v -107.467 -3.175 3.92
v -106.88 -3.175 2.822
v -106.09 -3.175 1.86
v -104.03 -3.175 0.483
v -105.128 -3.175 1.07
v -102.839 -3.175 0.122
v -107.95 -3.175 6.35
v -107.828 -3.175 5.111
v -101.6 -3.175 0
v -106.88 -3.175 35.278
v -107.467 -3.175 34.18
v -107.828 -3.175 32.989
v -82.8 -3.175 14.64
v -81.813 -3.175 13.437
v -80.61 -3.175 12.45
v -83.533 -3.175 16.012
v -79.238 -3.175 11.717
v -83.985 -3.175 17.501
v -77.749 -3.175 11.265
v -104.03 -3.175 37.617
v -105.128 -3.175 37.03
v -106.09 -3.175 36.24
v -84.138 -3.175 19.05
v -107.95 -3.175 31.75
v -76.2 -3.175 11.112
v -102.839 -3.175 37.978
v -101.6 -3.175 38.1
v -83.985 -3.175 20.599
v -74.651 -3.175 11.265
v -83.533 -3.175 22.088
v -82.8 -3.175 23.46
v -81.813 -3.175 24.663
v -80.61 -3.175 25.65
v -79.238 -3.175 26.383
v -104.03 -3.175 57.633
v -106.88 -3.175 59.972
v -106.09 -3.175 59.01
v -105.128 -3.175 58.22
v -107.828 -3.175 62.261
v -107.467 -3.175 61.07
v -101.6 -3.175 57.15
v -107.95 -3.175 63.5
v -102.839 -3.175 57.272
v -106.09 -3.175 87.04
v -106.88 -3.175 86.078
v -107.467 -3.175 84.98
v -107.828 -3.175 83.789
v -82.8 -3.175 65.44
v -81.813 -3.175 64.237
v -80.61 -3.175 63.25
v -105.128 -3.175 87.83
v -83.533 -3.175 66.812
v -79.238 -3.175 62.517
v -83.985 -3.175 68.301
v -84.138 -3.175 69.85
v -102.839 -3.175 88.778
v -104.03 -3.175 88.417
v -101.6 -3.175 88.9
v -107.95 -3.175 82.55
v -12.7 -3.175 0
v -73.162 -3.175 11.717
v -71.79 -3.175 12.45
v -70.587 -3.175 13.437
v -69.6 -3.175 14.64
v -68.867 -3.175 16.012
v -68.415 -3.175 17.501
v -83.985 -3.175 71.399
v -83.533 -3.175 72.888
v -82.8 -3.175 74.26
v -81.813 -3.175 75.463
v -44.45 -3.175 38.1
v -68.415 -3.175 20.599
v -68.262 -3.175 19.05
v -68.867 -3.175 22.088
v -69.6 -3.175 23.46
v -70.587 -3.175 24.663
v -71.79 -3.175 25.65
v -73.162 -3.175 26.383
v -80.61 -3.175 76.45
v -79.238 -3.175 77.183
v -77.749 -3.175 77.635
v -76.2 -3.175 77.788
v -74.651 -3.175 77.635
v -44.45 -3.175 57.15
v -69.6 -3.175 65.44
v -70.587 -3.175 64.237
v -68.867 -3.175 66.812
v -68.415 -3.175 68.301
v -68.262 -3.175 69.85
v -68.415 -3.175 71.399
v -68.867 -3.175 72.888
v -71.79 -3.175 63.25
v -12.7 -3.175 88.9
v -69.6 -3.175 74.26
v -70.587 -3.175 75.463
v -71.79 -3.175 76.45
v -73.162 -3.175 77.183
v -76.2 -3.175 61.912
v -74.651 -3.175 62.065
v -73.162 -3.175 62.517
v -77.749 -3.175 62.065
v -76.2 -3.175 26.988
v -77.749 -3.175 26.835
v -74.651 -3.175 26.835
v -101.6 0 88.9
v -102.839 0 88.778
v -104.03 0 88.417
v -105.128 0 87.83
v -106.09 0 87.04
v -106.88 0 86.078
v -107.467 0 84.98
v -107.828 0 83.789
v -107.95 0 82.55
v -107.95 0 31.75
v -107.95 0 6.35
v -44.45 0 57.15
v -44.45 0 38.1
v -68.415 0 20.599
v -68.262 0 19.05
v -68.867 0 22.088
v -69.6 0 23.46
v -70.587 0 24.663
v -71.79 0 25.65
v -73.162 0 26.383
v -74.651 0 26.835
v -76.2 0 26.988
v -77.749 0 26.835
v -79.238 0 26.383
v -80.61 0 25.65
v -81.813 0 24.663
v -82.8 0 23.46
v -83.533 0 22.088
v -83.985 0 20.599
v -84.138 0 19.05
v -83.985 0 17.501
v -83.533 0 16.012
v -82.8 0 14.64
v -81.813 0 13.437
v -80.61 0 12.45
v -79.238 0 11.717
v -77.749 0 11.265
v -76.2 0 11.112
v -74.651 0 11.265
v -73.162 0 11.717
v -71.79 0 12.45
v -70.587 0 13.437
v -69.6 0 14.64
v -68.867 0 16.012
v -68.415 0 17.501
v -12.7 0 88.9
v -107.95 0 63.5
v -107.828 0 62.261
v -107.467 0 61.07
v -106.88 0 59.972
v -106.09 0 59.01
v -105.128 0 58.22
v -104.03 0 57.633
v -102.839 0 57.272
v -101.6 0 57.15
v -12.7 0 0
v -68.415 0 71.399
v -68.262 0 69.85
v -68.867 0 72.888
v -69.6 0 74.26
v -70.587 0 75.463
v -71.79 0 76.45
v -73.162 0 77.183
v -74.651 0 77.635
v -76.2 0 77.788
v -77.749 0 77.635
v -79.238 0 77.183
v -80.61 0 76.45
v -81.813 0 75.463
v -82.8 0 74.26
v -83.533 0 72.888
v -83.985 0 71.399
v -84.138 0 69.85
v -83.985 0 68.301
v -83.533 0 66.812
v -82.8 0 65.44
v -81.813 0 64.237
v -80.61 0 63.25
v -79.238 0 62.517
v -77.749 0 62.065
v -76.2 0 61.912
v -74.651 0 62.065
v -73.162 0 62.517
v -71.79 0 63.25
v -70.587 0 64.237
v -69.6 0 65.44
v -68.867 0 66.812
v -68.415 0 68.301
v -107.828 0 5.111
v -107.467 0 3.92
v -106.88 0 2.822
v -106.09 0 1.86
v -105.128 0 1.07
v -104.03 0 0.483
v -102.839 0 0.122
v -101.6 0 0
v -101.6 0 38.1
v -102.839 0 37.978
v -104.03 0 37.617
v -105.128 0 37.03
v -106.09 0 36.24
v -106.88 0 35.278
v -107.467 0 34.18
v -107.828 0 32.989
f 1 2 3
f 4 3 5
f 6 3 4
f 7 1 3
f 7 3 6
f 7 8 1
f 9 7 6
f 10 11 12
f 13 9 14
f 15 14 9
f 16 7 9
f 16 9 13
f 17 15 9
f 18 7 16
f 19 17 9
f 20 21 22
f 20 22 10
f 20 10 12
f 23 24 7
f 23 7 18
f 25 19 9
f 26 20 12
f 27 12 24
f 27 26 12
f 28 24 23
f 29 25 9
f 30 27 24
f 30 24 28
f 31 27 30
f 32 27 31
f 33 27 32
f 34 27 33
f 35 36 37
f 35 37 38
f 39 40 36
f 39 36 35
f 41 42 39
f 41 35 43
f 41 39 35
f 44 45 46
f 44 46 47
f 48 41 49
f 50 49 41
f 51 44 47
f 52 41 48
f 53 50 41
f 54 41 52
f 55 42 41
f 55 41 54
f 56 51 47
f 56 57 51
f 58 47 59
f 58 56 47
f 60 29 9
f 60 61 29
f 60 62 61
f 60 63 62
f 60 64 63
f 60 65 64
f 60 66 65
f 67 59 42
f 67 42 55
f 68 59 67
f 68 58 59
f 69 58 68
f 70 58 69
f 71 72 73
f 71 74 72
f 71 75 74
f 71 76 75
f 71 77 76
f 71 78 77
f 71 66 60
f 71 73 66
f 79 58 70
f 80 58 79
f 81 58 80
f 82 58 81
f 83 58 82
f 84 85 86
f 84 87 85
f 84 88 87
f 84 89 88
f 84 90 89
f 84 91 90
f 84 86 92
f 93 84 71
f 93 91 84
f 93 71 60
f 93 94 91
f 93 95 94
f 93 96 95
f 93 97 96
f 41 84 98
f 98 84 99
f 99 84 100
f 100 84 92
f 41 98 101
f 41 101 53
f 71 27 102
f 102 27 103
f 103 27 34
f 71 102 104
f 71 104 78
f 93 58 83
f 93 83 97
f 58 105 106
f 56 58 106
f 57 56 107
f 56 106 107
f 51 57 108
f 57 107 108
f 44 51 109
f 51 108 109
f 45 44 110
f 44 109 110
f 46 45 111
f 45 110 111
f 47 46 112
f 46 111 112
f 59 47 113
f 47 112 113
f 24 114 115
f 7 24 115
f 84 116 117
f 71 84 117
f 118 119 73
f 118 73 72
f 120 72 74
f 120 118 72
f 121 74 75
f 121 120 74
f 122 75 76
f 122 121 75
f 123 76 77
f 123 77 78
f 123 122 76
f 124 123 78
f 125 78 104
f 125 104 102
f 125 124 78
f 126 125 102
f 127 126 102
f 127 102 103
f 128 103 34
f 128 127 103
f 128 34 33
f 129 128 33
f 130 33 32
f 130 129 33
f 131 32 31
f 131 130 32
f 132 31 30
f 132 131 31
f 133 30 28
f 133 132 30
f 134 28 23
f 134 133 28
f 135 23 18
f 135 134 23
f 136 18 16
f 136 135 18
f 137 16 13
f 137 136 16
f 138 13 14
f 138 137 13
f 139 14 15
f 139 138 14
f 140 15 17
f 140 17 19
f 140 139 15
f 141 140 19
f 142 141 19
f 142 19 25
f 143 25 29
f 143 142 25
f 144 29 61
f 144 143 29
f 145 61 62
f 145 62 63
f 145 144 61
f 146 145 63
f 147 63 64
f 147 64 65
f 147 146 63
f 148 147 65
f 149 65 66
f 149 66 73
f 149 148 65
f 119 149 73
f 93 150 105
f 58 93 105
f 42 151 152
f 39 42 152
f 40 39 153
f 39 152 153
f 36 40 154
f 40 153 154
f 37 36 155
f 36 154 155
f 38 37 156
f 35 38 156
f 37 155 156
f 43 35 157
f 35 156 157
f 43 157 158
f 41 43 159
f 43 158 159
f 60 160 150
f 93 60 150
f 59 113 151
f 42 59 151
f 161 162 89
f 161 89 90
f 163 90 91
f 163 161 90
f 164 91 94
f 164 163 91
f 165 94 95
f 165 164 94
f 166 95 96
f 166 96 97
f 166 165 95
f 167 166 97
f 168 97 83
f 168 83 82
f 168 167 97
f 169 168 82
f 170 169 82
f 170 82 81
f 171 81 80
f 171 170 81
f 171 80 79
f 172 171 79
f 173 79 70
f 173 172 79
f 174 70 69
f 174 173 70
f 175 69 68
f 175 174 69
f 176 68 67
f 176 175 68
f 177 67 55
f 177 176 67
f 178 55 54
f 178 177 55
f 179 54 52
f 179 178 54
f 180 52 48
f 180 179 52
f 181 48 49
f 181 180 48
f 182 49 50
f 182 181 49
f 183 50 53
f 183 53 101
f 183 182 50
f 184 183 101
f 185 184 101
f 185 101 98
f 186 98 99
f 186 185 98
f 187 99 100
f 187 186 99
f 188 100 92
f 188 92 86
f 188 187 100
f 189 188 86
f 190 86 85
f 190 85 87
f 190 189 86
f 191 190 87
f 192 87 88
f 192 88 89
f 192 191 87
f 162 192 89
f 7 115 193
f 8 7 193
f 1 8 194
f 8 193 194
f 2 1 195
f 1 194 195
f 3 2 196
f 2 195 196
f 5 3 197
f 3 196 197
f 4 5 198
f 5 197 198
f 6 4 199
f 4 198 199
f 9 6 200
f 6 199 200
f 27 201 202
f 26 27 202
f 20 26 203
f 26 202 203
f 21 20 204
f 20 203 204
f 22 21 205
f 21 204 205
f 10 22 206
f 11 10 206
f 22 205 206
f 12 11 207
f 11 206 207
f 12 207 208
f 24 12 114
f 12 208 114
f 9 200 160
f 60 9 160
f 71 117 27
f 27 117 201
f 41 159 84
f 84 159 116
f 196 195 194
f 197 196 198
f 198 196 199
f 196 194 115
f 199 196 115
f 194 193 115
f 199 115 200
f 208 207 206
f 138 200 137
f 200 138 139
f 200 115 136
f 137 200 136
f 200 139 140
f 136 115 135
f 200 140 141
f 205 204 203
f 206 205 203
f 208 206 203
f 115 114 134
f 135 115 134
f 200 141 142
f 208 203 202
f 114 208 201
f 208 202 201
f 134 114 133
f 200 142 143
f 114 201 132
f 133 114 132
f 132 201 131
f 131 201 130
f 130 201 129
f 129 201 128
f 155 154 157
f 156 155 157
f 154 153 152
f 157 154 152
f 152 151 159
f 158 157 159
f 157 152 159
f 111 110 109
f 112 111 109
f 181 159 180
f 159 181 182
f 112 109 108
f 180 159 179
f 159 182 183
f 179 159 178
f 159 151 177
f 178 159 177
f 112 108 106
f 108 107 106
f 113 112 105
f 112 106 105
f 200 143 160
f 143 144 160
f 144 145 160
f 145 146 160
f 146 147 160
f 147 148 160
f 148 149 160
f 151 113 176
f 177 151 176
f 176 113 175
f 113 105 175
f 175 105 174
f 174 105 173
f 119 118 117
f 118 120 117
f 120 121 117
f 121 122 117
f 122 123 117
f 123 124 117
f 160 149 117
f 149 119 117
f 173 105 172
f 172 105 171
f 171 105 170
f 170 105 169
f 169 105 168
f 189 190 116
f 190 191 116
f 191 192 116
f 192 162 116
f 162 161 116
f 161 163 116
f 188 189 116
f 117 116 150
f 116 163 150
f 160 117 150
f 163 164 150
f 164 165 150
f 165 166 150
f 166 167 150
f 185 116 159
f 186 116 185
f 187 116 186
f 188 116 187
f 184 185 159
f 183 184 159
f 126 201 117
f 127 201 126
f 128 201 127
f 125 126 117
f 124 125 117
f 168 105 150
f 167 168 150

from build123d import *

# Parameters (mm, degrees)
F0_R     = 7.9375
F1_DEPTH = 3.175


# Not quite as in the source:
# - a feature names something its author has since deleted; it is built from what else it names


with BuildPart() as f1:
    # F0 (on Front) → F1 (new body)
    with BuildSketch(Plane.XZ):
        with BuildLine():
            Line((-107.95, 82.55), (-107.95, 63.5))
            ThreePointArc((-107.95, 63.5), (-106.0901280605, 59.0098719395), (-101.6, 57.15))
            Line((-101.6, 57.15), (-44.45, 57.15))
            Line((-44.45, 57.15), (-44.45, 88.9))
            Line((-44.45, 88.9), (-101.6, 88.9))
            ThreePointArc((-101.6, 88.9), (-106.0901280605, 87.0401280605), (-107.95, 82.55))
        make_face()
        with Locations((-76.2, 69.85)):
            Circle(F0_R, mode=Mode.SUBTRACT)
        Polygon((-44.45, 88.9), (-44.45, 57.15), (-44.45, 38.1), (-44.45, 0), (-12.7, 0), (-12.7, 88.9), align=None)
        with BuildLine():
            Line((-44.45, 0), (-44.45, 38.1))
            Line((-44.45, 38.1), (-101.6, 38.1))
            ThreePointArc((-101.6, 38.1), (-106.0901280605, 36.2401280605), (-107.95, 31.75))
            Line((-107.95, 31.75), (-107.95, 6.35))
            ThreePointArc((-107.95, 6.35), (-106.0901280605, 1.8598719395), (-101.6, 0))
            Line((-101.6, 0), (-95.25, 0))
            Line((-95.25, 0), (-44.45, 0))
        make_face()
        with Locations((-76.2, 19.05)):
            Circle(F0_R, mode=Mode.SUBTRACT)
    extrude(amount=F1_DEPTH)


solid = f1.part
